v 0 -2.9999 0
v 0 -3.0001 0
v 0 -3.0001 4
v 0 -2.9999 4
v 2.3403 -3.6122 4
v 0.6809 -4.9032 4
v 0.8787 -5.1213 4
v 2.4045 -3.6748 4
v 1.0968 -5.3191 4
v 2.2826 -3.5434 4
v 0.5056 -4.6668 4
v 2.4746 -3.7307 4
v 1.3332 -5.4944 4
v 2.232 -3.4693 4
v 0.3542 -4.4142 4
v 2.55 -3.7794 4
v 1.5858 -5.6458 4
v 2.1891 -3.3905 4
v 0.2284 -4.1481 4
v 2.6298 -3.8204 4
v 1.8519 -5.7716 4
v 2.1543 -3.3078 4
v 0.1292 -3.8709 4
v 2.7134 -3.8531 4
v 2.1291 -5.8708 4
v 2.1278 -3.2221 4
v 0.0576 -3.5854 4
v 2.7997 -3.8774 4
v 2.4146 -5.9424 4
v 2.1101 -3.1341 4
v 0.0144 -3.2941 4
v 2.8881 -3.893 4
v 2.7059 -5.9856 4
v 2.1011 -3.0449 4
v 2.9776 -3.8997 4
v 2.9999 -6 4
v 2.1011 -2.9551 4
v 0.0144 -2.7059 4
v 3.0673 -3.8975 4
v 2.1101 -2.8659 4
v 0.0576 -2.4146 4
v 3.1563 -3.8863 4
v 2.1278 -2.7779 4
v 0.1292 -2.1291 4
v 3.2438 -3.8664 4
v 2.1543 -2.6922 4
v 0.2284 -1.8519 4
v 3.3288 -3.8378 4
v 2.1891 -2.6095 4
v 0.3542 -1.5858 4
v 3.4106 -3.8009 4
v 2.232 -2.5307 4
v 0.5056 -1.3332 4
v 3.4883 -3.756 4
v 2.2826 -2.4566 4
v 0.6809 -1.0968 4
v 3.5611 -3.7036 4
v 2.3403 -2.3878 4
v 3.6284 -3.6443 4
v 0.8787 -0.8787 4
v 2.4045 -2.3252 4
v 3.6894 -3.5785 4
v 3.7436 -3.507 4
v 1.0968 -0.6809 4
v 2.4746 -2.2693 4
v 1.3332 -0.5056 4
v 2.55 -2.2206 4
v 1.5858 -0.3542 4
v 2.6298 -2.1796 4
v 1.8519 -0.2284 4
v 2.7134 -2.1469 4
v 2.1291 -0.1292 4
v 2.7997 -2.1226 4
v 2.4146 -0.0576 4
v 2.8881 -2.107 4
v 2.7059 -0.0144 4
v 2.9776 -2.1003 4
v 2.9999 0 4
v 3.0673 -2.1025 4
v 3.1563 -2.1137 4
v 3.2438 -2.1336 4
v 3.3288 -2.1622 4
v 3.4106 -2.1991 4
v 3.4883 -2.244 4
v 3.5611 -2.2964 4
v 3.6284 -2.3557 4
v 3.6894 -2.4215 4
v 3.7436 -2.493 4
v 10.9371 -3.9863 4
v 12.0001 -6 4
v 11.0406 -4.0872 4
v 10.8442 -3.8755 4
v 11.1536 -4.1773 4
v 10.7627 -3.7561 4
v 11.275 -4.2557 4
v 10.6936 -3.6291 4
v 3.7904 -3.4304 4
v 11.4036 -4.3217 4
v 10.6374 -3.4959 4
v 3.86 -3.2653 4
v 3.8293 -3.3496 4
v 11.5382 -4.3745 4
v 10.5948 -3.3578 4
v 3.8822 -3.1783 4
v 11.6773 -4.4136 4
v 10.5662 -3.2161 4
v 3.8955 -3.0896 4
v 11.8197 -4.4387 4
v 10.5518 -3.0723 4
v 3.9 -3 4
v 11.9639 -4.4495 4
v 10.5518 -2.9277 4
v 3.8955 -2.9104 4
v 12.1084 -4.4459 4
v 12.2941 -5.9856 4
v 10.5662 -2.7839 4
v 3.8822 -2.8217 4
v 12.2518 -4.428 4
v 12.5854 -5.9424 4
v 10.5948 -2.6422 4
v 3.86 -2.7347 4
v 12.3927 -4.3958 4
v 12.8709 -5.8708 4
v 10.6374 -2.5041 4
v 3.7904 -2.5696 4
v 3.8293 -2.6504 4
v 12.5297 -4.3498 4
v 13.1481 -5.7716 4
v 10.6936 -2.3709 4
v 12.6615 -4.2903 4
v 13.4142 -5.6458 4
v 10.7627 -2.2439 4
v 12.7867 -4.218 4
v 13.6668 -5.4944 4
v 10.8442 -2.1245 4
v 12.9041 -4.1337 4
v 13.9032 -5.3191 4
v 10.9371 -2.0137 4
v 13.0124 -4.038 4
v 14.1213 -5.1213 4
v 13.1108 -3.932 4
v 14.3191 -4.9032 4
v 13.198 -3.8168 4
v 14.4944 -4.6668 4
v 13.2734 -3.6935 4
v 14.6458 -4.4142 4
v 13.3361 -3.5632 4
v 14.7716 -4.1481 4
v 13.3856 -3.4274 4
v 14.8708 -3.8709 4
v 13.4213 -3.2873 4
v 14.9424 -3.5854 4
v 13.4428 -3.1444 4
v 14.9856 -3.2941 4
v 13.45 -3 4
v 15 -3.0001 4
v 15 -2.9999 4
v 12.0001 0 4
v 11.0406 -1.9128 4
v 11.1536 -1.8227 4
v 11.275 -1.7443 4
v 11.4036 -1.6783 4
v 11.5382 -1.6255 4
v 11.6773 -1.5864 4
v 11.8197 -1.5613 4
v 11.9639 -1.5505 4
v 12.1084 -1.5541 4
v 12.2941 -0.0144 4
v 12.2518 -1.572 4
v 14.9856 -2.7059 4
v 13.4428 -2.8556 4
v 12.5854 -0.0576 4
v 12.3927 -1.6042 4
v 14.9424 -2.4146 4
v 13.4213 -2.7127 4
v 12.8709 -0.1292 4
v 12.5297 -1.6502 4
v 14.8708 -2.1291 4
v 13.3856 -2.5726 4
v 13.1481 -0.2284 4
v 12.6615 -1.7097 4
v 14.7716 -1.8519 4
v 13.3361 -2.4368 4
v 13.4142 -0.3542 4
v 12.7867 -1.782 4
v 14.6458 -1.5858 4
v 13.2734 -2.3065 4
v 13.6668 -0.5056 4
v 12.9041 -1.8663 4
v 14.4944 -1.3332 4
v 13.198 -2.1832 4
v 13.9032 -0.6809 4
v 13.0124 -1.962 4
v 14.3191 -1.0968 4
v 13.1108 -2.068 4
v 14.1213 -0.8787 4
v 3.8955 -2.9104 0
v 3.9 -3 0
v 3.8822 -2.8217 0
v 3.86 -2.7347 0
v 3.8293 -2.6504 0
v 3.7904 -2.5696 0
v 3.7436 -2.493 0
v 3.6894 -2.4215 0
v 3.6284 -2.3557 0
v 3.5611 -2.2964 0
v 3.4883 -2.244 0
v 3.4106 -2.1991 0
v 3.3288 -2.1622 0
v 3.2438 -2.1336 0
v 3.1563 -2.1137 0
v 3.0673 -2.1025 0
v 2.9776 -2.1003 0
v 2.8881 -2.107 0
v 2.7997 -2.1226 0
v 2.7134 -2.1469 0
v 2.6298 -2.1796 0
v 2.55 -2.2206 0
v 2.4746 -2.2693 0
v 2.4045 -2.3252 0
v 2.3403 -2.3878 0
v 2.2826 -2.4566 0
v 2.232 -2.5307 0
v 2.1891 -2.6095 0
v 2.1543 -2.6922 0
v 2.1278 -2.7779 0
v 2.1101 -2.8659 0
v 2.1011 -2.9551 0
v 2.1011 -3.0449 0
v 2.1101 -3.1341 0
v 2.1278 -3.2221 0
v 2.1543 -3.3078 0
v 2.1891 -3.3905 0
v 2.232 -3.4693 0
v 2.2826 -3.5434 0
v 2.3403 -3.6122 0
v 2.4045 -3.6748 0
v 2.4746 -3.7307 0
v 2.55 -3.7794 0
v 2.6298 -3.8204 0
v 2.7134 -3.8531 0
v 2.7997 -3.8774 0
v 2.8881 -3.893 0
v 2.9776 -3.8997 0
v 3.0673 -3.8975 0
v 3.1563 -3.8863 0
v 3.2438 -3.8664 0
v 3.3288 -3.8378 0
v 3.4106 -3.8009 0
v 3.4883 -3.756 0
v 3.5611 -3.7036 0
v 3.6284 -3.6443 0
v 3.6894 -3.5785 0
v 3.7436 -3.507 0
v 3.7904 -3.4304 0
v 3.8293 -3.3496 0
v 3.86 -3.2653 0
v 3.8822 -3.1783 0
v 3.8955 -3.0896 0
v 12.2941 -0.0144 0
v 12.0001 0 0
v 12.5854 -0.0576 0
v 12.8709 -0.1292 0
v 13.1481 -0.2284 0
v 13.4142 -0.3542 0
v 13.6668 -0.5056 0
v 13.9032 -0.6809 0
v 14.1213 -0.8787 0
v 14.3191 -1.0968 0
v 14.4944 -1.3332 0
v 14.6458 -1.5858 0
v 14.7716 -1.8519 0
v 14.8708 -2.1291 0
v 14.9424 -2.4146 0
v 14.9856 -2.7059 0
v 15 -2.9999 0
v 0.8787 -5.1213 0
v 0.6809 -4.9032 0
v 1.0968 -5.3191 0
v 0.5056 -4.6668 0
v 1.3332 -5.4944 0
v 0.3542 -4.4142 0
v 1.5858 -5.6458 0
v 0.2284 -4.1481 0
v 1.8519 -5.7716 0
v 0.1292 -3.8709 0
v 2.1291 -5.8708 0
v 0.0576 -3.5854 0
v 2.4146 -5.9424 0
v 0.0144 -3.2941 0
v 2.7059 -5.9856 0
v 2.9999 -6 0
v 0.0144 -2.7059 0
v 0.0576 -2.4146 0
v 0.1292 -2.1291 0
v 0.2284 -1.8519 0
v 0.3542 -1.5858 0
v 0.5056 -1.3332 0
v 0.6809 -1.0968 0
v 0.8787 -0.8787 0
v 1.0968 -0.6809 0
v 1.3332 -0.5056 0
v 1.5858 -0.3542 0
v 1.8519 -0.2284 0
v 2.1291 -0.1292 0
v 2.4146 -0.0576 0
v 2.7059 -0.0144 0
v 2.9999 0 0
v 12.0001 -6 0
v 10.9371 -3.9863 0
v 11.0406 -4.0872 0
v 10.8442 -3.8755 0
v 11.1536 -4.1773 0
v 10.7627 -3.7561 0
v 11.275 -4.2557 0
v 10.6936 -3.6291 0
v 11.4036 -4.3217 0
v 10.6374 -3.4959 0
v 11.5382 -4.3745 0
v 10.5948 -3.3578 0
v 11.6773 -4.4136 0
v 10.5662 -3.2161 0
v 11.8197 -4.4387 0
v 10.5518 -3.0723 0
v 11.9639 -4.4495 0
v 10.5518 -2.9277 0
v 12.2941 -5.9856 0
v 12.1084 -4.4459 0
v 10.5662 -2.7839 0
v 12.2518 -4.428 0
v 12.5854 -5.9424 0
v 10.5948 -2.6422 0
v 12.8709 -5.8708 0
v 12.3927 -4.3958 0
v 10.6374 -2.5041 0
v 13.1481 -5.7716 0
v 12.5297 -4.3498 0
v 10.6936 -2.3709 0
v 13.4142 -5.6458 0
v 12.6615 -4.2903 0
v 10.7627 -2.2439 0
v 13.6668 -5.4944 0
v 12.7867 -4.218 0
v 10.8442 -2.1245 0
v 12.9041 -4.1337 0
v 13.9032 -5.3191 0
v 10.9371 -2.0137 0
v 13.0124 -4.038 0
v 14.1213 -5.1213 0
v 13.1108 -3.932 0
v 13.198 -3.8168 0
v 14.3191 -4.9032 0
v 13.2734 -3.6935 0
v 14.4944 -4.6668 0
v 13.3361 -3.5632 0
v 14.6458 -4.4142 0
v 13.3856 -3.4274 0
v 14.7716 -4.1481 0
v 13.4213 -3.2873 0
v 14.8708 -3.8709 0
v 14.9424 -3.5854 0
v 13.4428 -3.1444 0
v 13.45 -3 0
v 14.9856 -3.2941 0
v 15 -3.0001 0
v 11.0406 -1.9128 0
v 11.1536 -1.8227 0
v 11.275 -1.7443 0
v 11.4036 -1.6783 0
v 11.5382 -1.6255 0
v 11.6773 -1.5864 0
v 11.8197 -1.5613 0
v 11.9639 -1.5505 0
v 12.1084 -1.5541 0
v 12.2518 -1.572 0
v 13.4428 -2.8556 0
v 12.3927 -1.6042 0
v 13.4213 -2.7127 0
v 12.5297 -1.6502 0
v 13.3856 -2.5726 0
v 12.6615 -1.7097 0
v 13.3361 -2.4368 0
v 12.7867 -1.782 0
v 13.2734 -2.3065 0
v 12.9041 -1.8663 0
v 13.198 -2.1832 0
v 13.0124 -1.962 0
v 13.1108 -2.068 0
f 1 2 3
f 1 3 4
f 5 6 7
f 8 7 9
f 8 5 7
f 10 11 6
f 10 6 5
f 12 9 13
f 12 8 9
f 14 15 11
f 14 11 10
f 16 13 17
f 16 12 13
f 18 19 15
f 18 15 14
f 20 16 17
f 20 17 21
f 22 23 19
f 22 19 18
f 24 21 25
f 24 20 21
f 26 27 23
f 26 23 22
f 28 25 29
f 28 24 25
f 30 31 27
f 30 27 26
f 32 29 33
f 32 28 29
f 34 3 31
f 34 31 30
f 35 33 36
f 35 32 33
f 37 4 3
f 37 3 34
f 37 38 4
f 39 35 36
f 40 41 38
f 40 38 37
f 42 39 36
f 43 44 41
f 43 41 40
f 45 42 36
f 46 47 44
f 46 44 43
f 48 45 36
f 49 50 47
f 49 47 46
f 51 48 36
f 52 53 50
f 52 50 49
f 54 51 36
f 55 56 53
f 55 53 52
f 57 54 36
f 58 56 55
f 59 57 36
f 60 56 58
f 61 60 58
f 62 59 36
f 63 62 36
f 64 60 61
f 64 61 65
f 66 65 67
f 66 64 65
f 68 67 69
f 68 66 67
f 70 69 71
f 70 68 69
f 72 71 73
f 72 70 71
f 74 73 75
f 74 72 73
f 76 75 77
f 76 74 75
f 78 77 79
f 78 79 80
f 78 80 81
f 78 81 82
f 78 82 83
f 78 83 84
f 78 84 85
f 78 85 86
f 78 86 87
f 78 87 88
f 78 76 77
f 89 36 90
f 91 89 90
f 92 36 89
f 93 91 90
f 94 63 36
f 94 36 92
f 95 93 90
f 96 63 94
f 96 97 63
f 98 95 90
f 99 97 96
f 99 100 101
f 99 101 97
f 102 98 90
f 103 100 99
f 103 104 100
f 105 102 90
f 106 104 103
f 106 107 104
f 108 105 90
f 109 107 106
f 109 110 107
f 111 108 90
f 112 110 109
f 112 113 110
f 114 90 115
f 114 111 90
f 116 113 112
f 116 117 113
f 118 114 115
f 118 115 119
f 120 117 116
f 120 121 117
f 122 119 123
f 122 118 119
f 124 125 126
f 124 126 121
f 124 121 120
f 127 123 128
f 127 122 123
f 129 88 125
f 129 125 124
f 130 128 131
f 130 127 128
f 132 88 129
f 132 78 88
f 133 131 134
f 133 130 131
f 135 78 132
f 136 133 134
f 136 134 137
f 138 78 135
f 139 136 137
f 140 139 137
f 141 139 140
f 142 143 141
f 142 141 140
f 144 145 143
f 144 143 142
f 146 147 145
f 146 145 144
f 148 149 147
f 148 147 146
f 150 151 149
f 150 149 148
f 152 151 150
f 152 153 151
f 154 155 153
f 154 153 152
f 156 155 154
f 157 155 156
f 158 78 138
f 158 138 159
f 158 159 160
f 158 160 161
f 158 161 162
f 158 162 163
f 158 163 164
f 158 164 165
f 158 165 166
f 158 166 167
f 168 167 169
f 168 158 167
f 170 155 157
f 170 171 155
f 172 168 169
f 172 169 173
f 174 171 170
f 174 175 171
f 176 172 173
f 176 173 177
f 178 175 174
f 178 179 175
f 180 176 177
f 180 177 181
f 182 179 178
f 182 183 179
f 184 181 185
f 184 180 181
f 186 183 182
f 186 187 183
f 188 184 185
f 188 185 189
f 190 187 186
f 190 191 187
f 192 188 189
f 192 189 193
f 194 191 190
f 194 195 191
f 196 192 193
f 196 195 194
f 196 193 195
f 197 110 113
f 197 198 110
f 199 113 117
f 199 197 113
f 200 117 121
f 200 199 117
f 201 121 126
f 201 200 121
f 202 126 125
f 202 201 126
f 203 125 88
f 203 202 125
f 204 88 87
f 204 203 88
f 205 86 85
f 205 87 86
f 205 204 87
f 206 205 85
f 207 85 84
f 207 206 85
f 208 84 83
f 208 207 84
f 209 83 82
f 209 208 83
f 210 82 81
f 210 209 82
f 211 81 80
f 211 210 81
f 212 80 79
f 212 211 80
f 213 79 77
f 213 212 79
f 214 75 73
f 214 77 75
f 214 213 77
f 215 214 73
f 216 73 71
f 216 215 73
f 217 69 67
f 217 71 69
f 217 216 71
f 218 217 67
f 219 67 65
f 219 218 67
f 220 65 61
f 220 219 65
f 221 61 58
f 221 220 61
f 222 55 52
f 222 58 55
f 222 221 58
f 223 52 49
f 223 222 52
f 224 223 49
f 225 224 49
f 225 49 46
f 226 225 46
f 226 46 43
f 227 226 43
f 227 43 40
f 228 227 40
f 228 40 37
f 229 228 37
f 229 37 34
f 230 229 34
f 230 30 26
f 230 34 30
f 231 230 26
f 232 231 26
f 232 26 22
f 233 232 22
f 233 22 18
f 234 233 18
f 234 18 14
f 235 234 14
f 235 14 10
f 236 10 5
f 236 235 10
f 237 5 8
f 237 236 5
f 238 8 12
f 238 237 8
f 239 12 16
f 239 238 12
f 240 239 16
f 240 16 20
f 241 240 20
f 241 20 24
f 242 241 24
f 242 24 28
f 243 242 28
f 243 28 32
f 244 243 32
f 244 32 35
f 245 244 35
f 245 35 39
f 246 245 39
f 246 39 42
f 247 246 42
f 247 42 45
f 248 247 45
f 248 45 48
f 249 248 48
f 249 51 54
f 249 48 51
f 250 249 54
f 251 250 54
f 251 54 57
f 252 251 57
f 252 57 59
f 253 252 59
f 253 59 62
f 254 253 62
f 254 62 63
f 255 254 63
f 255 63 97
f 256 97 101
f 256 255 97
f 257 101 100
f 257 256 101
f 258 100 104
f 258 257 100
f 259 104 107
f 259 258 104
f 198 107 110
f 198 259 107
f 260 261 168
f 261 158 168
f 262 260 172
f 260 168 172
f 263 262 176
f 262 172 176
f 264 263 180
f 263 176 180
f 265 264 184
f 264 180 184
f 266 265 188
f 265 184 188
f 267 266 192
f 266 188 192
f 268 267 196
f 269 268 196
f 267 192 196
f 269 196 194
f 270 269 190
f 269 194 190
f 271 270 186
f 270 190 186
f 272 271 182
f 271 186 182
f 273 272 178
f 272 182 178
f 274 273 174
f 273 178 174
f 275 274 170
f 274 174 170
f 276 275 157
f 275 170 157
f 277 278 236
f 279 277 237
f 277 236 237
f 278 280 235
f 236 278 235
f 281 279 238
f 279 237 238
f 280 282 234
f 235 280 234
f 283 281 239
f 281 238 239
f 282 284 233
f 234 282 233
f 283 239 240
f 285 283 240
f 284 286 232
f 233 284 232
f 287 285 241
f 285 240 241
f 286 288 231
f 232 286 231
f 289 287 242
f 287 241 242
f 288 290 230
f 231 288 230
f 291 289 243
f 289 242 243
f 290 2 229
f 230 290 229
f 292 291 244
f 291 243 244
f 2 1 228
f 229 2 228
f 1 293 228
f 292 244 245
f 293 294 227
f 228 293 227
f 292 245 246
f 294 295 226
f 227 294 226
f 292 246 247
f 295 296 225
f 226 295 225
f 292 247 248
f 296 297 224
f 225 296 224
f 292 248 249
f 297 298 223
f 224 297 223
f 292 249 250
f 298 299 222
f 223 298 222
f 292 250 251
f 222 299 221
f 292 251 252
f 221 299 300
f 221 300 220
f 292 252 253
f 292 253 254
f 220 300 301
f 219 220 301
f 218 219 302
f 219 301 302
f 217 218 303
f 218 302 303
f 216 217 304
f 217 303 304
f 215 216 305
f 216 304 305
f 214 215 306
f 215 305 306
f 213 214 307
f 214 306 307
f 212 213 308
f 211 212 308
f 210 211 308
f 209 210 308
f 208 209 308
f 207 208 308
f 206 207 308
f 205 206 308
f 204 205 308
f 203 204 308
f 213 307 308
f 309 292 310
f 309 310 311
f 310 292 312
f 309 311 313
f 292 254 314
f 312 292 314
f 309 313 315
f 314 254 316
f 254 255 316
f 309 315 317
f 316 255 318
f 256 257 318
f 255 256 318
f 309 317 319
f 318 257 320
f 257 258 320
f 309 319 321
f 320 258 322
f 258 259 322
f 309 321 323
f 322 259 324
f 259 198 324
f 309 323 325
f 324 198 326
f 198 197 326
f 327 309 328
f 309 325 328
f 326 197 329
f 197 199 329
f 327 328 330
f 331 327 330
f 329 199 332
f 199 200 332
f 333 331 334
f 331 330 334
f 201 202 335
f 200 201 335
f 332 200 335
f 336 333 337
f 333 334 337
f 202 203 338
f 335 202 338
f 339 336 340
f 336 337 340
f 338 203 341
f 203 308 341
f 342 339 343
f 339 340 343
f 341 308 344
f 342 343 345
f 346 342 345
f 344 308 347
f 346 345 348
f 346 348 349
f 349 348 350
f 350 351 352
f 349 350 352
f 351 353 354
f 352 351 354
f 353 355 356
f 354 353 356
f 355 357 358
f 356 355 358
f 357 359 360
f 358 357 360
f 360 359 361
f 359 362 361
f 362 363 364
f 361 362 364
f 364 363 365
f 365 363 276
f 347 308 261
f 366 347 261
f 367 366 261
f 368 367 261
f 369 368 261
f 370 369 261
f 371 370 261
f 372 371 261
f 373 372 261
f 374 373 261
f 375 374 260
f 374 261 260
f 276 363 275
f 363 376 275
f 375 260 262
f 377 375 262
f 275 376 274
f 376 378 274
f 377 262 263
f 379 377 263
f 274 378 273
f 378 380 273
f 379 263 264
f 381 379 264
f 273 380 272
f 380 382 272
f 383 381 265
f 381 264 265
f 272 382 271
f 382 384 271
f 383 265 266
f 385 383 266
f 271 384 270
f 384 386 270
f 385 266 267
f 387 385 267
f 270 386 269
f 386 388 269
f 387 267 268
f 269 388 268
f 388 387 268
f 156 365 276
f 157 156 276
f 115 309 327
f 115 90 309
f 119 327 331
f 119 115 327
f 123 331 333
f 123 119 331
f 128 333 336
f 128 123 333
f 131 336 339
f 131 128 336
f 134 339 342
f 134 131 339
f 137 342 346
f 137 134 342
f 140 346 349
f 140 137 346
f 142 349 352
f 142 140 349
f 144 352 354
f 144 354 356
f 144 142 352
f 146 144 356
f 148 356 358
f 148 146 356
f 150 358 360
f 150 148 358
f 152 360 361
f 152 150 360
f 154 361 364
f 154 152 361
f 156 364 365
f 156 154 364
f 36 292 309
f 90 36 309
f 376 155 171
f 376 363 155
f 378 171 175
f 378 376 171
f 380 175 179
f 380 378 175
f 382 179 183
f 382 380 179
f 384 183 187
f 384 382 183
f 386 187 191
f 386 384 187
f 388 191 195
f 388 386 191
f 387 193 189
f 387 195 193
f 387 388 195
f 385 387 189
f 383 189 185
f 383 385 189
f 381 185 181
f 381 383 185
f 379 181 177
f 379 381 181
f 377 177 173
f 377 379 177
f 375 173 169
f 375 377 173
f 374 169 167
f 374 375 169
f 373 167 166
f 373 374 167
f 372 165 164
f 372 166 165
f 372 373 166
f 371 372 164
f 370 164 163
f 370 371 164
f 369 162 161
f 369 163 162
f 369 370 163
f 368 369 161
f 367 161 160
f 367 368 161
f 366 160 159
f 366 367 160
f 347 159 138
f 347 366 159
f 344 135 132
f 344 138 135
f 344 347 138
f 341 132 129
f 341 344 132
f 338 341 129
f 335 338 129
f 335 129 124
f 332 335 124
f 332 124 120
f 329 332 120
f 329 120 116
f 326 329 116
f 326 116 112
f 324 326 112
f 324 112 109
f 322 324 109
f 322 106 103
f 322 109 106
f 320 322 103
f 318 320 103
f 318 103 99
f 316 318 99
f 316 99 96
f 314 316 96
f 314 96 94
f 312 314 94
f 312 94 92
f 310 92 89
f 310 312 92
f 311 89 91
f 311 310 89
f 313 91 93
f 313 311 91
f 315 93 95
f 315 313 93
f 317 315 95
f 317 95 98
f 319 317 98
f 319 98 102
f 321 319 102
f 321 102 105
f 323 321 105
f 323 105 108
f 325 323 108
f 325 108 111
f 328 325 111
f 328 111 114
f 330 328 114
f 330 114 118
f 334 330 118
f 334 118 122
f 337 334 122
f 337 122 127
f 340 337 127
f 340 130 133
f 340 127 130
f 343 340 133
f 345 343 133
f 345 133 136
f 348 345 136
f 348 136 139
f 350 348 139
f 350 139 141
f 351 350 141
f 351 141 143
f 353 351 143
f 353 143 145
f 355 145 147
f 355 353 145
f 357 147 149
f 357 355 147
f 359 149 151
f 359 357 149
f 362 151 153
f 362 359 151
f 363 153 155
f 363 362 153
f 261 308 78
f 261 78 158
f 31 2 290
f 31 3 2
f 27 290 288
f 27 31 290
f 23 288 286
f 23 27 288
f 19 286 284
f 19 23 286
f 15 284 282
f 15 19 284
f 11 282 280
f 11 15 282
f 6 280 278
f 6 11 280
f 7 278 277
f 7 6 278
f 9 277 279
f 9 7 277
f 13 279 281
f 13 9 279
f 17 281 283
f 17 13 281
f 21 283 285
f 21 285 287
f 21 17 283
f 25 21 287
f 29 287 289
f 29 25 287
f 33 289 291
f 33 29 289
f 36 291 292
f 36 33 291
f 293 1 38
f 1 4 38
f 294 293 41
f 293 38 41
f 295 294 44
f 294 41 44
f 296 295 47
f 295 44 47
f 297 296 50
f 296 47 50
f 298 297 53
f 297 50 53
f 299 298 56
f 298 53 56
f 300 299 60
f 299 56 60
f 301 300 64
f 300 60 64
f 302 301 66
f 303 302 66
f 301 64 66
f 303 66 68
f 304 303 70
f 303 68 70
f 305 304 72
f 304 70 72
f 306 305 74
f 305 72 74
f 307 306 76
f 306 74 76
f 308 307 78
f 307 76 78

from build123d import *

# Parameters (mm, degrees)
SKETCH1_W               = 15
SKETCH1_H               = 6
BOSS_EXTRUDE1_DEPTH     = 4
CUT_EXTRUDE1_DEPTH      = 17.643316977
CUT_EXTRUDE1_DEPTH_BACK = 17.643316977
SKETCH2_R               = 0.9
SKETCH2_R_2             = 1.45
FILLET1_R               = 3


with BuildPart() as part:
    # Sketch1 → Boss-Extrude1 (new body)
    with BuildSketch(Plane.XY):
        with Locations((7.5, -3)):
            Rectangle(SKETCH1_W, SKETCH1_H)
    extrude(amount=BOSS_EXTRUDE1_DEPTH)

    # Sketch2 → Cut-Extrude1 (cut, two sides: drawn at the far end of the back side and taken through both)
    with BuildSketch(Plane.XY.offset(4).offset(-CUT_EXTRUDE1_DEPTH_BACK)):
        with Locations((3, -3)):
            Circle(SKETCH2_R)
        with Locations((12, -3)):
            Circle(SKETCH2_R_2)
    extrude(amount=CUT_EXTRUDE1_DEPTH + CUT_EXTRUDE1_DEPTH_BACK, mode=Mode.SUBTRACT)

    # Fillet1
    fillet1_edges = [part.edges().sort_by_distance(p)[0] for p in [
        (15, -6, 2),
        (15, 0, 2),
        (0, -6, 2),
        (0, 0, 2),
    ]]
    fillet(fillet1_edges, radius=FILLET1_R - 0.0001)  # a hair under: the kernel refuses the full size


solid = part.part
